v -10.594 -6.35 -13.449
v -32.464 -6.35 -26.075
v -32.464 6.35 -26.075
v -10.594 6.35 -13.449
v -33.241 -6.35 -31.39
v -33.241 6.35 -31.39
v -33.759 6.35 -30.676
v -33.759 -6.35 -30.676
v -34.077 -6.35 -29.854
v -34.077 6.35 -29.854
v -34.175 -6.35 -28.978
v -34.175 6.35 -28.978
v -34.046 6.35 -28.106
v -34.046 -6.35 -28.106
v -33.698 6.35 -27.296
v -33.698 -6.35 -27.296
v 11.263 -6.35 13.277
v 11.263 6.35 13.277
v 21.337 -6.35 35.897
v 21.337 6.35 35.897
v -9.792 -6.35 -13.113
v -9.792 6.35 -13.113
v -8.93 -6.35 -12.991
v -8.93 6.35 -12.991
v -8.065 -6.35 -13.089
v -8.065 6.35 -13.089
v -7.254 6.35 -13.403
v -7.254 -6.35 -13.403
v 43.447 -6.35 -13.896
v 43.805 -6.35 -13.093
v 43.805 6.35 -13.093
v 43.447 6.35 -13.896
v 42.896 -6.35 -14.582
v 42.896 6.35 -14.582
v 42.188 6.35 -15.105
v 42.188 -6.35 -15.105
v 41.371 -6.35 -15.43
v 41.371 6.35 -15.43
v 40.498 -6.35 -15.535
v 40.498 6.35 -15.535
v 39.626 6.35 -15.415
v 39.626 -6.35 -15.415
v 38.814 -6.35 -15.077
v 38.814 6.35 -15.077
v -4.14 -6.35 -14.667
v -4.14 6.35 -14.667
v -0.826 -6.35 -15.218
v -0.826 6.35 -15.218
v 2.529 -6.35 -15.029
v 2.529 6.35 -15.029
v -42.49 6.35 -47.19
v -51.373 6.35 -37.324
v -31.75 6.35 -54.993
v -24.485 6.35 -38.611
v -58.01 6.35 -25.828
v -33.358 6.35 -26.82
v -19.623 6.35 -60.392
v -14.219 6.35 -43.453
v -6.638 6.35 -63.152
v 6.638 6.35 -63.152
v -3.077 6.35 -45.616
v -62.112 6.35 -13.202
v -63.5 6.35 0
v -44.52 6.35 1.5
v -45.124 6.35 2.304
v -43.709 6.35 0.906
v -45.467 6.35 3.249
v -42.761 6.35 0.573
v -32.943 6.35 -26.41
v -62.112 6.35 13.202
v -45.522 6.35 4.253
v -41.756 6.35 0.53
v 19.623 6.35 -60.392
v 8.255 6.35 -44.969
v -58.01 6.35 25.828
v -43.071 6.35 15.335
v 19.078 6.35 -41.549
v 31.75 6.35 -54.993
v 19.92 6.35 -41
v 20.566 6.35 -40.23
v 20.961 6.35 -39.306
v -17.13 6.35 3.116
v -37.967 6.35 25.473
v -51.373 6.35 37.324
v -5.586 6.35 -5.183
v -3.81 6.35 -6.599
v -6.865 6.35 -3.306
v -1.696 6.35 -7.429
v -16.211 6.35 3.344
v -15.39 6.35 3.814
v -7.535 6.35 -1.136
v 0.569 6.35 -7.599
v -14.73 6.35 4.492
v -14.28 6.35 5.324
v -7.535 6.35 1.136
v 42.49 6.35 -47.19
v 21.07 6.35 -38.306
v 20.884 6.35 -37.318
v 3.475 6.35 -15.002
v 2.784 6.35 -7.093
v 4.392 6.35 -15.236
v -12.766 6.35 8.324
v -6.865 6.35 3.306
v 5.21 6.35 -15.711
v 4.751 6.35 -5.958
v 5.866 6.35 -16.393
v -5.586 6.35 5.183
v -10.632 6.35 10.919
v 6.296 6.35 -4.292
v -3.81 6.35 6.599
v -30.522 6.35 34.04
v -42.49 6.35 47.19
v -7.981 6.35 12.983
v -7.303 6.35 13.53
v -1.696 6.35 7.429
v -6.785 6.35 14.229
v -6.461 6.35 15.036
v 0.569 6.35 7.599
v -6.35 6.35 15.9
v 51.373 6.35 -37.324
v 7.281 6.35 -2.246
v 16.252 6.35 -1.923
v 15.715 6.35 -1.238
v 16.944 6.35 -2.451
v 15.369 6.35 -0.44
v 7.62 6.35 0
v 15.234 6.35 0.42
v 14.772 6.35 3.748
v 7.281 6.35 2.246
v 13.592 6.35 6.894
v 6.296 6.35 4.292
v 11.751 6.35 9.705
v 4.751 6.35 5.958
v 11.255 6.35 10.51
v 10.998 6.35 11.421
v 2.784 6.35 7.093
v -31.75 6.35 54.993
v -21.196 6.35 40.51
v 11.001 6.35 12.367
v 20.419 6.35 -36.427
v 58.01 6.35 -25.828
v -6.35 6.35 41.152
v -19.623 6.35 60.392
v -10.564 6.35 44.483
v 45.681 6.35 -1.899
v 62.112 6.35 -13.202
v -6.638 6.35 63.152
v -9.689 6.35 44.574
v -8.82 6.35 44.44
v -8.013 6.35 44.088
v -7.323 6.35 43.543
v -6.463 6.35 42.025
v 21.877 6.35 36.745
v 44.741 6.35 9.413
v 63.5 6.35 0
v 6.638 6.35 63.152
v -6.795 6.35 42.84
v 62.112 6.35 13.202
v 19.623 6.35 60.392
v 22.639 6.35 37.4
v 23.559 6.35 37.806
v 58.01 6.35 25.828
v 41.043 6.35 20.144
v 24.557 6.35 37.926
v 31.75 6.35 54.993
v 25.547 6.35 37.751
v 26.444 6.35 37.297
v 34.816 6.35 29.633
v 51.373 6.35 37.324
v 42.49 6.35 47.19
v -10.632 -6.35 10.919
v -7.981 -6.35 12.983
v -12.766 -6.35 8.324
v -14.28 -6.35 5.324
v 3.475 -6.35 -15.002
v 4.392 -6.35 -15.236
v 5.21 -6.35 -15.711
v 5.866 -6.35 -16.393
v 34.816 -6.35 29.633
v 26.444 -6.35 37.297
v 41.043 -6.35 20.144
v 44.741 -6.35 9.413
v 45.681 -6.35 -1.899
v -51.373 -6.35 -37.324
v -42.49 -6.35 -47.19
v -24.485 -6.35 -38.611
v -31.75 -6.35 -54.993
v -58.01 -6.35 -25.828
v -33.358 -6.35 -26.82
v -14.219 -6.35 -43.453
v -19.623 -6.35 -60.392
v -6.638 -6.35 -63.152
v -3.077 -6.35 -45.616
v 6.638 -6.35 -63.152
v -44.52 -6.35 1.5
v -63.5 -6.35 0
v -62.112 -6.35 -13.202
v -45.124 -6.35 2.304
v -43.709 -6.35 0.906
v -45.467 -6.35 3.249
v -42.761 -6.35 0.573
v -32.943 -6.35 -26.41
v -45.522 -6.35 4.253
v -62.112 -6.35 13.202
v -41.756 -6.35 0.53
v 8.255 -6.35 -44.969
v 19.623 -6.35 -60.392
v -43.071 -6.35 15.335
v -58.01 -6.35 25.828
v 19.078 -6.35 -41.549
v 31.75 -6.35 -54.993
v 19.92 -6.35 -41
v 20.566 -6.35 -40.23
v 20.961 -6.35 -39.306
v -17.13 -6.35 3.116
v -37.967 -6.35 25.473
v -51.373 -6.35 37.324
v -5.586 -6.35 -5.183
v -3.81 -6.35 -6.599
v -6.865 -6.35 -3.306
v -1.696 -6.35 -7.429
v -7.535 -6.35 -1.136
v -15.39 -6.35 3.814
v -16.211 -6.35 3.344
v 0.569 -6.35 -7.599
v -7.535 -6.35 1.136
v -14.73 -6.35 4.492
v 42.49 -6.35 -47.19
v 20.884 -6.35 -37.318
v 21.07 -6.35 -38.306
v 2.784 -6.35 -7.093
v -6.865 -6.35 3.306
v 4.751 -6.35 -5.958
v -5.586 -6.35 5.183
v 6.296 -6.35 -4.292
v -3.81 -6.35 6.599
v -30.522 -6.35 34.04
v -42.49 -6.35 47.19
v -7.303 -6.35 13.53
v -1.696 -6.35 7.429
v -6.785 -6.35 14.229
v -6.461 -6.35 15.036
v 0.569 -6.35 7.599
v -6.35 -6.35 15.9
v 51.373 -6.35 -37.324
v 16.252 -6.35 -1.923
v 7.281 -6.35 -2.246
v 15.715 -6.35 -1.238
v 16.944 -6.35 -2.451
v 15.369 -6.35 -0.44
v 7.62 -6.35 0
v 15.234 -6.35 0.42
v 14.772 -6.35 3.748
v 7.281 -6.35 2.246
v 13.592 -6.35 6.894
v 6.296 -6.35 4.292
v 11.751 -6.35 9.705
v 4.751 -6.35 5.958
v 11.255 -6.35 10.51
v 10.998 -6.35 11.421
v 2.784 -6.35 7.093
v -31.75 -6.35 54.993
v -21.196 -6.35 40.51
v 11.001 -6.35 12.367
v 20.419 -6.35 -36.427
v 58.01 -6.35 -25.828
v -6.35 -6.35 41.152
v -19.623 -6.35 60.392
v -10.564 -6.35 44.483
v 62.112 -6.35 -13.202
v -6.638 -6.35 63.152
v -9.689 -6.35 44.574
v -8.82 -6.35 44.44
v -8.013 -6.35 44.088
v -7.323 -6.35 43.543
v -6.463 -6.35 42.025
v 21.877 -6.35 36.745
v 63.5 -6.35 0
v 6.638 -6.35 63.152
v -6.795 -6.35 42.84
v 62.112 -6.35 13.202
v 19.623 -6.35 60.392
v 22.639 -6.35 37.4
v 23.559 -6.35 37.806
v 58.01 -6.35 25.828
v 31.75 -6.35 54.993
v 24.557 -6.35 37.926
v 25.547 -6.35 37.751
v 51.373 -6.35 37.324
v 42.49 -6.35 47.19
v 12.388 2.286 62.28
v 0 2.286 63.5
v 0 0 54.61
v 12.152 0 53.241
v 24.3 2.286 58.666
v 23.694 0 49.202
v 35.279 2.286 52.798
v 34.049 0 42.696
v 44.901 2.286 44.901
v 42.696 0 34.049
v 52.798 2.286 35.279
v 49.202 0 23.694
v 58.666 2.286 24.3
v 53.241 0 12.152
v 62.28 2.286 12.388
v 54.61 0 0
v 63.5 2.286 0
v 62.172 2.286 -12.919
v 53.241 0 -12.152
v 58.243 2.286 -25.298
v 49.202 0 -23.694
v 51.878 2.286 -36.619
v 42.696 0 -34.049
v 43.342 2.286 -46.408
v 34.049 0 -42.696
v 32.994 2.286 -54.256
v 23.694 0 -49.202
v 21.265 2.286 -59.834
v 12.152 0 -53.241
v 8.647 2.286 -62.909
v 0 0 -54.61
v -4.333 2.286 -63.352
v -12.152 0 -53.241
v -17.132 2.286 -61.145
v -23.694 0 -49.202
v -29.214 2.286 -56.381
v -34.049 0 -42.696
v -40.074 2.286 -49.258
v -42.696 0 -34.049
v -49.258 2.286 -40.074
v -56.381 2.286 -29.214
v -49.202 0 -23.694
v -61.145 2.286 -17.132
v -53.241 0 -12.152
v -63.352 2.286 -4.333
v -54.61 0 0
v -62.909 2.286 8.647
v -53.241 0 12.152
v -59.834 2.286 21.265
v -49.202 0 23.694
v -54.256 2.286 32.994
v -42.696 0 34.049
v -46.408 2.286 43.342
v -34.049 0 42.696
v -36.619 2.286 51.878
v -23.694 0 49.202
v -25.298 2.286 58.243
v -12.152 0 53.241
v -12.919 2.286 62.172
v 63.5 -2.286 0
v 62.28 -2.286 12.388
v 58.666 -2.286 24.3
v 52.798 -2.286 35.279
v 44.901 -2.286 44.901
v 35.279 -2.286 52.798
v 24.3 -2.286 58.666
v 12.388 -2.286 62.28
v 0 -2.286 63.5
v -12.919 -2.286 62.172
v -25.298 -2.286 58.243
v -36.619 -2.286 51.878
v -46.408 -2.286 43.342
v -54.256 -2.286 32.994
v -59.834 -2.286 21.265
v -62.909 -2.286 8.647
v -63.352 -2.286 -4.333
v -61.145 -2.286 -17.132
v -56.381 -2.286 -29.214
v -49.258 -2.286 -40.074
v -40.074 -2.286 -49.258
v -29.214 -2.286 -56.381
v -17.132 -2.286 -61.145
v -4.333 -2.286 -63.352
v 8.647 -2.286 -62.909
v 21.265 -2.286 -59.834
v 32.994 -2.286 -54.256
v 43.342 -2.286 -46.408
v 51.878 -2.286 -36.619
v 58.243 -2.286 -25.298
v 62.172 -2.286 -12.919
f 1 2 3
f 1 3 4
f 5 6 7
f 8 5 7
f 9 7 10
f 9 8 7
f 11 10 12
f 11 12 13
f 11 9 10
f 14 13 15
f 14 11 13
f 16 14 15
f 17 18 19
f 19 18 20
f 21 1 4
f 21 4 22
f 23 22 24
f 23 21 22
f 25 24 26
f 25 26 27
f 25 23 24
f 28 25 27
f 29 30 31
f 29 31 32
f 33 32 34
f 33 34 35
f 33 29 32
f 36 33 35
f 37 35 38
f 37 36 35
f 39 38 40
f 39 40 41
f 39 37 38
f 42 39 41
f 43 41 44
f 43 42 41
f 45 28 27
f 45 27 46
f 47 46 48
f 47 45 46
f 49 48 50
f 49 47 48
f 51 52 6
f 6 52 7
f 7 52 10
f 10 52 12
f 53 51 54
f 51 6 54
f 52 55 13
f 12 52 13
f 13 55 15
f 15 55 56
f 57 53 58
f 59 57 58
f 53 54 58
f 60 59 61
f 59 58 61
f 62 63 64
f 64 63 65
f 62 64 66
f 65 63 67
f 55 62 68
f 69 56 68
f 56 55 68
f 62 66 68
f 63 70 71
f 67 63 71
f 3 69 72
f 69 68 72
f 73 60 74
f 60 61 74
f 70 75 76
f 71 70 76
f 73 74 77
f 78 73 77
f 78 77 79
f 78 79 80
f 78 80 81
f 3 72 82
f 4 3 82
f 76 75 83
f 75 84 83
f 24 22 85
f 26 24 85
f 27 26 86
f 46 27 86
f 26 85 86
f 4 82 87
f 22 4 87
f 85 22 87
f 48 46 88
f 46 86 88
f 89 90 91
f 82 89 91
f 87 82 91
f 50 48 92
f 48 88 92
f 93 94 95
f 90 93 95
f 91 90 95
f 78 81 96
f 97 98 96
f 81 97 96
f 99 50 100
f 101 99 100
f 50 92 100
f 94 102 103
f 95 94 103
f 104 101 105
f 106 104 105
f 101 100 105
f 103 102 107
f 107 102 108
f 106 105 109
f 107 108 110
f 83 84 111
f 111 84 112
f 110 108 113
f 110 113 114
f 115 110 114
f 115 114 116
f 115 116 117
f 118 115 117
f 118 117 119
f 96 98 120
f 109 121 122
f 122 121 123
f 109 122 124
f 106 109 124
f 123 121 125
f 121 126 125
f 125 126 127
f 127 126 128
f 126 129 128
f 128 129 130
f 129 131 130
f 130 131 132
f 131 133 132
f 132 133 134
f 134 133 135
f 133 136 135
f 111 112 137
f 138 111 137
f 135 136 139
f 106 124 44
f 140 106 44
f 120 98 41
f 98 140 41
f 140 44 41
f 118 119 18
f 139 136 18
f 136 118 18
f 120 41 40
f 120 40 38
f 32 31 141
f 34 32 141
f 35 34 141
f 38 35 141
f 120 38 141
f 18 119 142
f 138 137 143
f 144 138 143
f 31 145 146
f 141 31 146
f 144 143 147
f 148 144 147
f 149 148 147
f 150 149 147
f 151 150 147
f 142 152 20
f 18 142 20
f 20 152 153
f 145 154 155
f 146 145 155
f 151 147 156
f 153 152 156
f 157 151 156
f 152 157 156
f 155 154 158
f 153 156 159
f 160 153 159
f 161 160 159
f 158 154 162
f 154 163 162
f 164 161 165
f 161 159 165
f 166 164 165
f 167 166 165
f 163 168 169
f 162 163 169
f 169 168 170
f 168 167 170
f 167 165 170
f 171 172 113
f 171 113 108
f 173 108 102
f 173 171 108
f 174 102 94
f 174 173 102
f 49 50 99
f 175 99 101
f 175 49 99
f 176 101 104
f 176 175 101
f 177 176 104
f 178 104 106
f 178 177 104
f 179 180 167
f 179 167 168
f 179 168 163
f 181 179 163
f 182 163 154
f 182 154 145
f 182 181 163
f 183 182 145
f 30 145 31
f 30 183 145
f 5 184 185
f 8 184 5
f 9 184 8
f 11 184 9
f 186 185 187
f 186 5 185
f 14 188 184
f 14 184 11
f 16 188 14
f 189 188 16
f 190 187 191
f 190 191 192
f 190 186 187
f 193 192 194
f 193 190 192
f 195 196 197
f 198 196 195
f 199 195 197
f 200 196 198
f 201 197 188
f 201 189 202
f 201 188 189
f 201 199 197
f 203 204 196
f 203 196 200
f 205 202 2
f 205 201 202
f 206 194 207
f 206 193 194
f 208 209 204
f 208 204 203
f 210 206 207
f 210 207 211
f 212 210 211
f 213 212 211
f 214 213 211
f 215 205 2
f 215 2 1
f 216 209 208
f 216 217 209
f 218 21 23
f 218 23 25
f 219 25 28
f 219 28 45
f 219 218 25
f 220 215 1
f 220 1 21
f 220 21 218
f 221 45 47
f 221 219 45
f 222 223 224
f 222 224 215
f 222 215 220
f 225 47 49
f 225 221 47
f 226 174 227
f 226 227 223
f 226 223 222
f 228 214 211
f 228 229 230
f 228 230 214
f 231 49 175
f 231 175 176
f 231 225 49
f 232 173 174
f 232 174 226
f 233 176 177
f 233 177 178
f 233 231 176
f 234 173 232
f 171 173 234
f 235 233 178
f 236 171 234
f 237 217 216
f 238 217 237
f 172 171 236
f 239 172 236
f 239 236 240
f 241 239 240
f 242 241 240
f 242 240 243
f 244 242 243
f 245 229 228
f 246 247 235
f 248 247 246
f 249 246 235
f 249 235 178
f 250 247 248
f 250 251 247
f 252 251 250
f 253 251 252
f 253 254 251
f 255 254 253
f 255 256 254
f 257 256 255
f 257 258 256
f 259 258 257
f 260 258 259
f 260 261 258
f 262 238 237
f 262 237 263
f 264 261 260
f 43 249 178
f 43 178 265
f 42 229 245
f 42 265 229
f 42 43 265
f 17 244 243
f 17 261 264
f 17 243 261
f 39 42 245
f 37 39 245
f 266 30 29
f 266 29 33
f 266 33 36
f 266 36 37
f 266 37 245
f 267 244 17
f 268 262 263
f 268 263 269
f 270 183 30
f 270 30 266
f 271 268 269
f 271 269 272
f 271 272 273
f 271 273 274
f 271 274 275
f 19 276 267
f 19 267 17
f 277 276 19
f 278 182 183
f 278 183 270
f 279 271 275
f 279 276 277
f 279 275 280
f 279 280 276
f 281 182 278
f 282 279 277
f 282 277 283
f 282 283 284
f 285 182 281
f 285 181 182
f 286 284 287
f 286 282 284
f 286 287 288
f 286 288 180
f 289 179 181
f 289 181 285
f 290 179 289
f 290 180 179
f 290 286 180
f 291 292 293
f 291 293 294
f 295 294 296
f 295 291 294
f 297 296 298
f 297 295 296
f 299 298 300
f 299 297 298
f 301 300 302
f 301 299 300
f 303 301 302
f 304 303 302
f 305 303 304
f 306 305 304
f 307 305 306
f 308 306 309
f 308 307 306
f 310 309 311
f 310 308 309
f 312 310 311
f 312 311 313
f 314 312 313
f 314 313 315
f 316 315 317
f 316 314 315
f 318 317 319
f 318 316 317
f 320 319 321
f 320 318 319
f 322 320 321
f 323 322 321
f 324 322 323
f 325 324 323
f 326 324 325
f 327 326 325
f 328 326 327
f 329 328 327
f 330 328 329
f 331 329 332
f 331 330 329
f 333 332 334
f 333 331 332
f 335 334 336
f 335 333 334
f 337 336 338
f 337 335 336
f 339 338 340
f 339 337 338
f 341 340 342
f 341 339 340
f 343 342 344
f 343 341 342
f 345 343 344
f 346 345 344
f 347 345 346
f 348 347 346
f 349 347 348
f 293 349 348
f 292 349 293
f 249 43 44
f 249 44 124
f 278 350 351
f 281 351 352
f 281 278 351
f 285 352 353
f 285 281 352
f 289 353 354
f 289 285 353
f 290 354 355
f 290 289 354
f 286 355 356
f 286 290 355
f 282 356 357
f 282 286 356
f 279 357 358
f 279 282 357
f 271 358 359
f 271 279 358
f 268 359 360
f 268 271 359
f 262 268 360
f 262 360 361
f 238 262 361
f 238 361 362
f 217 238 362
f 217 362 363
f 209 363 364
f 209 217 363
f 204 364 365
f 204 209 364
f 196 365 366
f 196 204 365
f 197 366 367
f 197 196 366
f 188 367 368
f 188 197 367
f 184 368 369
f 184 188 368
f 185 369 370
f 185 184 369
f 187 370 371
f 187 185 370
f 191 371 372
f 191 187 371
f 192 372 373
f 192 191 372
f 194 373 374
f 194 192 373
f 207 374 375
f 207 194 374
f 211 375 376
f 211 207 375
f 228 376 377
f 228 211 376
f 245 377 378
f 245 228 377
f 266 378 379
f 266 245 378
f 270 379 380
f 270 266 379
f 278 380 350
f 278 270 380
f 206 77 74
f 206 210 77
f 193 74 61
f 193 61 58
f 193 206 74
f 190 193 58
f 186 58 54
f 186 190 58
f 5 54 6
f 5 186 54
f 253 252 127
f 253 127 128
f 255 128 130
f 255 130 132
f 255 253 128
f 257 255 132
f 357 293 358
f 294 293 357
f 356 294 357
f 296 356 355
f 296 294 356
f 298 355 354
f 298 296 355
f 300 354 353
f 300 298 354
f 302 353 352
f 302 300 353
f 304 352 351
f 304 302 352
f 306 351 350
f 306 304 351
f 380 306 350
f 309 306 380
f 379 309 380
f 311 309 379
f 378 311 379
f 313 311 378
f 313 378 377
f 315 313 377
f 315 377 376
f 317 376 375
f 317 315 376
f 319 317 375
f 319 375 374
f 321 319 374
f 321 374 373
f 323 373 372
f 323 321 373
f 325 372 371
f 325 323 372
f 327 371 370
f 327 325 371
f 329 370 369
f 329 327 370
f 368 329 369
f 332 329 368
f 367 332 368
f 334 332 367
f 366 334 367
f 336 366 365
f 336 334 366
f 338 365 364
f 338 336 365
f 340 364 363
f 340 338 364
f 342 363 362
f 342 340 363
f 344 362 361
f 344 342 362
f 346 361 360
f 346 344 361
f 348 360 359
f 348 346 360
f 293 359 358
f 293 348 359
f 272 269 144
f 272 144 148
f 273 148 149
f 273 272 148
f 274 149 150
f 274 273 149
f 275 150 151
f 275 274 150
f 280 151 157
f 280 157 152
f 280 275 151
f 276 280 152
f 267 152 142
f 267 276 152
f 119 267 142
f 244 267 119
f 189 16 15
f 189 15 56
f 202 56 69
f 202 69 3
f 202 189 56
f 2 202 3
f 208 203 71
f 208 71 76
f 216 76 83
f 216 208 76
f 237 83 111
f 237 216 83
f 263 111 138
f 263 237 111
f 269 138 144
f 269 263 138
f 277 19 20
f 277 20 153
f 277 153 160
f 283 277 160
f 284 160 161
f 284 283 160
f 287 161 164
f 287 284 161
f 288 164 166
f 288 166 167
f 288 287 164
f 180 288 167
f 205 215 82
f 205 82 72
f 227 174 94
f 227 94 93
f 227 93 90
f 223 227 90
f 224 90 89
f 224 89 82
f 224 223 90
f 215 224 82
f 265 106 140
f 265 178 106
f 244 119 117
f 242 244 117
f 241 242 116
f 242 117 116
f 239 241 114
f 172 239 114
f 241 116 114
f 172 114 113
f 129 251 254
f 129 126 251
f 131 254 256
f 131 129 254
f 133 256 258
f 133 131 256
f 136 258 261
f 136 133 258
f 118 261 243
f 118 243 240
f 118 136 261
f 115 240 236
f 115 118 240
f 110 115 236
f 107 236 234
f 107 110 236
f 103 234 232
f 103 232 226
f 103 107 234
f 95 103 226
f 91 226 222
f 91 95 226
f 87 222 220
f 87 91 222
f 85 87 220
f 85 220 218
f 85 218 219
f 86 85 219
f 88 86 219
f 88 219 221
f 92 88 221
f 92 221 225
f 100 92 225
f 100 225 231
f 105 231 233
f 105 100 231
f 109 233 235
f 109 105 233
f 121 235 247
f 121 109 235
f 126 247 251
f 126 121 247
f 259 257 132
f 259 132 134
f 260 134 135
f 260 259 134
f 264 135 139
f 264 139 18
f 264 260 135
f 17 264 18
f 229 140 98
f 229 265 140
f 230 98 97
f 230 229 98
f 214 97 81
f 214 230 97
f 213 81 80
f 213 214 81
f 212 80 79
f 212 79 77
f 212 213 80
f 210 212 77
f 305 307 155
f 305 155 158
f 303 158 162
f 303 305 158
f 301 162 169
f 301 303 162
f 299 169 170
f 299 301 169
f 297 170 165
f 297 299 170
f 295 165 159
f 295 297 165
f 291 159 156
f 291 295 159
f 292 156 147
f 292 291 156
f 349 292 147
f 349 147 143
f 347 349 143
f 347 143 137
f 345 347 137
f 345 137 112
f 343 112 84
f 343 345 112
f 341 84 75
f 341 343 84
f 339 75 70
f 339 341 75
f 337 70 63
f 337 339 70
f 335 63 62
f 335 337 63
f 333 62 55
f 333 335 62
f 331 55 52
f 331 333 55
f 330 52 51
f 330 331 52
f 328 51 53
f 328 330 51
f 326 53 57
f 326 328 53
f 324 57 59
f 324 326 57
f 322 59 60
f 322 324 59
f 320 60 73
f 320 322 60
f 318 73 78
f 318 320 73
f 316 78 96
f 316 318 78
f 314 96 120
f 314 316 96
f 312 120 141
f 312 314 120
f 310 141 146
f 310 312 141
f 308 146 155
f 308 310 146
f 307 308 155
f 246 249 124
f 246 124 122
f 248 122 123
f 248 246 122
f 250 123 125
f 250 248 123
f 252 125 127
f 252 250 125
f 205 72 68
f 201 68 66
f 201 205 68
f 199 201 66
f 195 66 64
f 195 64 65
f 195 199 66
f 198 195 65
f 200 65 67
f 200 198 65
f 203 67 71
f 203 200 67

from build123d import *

# Parameters (mm, degrees)
F0_R     = 63.5
F0_R_2   = 7.62
F1_DEPTH = 6.35


with BuildPart() as f1:
    # F0 (on Front) → F1 (new body, symmetric)
    with BuildSketch(Plane.XZ):
        Circle(F0_R)
        with BuildLine():
            ThreePointArc((-33.697905, -27.295793), (-33.159597, -26.606146), (-32.464053, -26.075478))
            Line((-32.464053, -26.075478), (-10.594432, -13.449047))
            ThreePointArc((-10.594432, -13.449047), (-8.930055, -12.990774), (-7.25369, -13.403043))
            ThreePointArc((-7.25369, -13.403043), (-2.498289, -15.033834), (2.528965, -15.028704))
            ThreePointArc((2.528965, -15.028704), (4.391844, -15.235603), (5.866486, -16.392562))
            Line((5.866486, -16.392562), (20.419015, -36.426942))
            ThreePointArc((20.419015, -36.426942), (20.960921, -39.305626), (19.077861, -41.549412))
            ThreePointArc((19.077861, -41.549412), (-8.715152, -44.881672), (-33.241292, -31.390045))
            ThreePointArc((-33.241292, -31.390045), (-34.154471, -29.4193), (-33.697905, -27.295793))
        make_face(mode=Mode.SUBTRACT)
        with BuildLine():
            ThreePointArc((-45.521777, 4.252793), (-34.511093, 29.988379), (-10.56393, 44.482826))
            ThreePointArc((-10.56393, 44.482826), (-7.650549, 43.837984), (-6.35, 41.152434))
            Line((-6.35, 41.152434), (-6.35, 15.899571))
            ThreePointArc((-6.35, 15.899571), (-6.785313, 14.229042), (-7.980531, 12.983402))
            ThreePointArc((-7.980531, 12.983402), (-11.770537, 9.680499), (-14.279722, 5.324203))
            ThreePointArc((-14.279722, 5.324203), (-15.390341, 3.814353), (-17.129618, 3.115755))
            Line((-17.129618, 3.115755), (-41.756164, 0.530086))
            ThreePointArc((-41.756164, 0.530086), (-44.520131, 1.500123), (-45.521777, 4.252793))
        make_face(mode=Mode.SUBTRACT)
        Circle(F0_R_2, mode=Mode.SUBTRACT)
        with BuildLine():
            Line((11.263132, 13.276807), (21.33715, 35.896856))
            ThreePointArc((21.33715, 35.896856), (23.55921, 37.805503), (26.443915, 37.296618))
            ThreePointArc((26.443915, 37.296618), (43.226245, 14.893293), (43.805222, -13.092781))
            ThreePointArc((43.805222, -13.092781), (41.790083, -15.293422), (38.814053, -15.076956))
            Line((38.814053, -15.076956), (16.944432, -2.450524))
            ThreePointArc((16.944432, -2.450524), (15.715368, -1.238268), (15.234221, 0.419642))
            ThreePointArc((15.234221, 0.419642), (14.268826, 5.353335), (11.750756, 9.7045))
            ThreePointArc((11.750756, 9.7045), (10.998497, 11.42125), (11.263132, 13.276807))
        make_face(mode=Mode.SUBTRACT)
    extrude(amount=F1_DEPTH, both=True)

    # F2 (on Right) → F3 (revolve, cut)
    with BuildSketch(Plane.YZ):
        Polygon((-2.286, 63.5), (0, 54.61), (0, 63.5), align=None)
        Polygon((0, 63.5), (0, 54.61), (2.286, 63.5), align=None)
    revolve(axis=Axis((0, -4.296992, 0), (0, 1, 0)), mode=Mode.SUBTRACT)


solid = f1.part
